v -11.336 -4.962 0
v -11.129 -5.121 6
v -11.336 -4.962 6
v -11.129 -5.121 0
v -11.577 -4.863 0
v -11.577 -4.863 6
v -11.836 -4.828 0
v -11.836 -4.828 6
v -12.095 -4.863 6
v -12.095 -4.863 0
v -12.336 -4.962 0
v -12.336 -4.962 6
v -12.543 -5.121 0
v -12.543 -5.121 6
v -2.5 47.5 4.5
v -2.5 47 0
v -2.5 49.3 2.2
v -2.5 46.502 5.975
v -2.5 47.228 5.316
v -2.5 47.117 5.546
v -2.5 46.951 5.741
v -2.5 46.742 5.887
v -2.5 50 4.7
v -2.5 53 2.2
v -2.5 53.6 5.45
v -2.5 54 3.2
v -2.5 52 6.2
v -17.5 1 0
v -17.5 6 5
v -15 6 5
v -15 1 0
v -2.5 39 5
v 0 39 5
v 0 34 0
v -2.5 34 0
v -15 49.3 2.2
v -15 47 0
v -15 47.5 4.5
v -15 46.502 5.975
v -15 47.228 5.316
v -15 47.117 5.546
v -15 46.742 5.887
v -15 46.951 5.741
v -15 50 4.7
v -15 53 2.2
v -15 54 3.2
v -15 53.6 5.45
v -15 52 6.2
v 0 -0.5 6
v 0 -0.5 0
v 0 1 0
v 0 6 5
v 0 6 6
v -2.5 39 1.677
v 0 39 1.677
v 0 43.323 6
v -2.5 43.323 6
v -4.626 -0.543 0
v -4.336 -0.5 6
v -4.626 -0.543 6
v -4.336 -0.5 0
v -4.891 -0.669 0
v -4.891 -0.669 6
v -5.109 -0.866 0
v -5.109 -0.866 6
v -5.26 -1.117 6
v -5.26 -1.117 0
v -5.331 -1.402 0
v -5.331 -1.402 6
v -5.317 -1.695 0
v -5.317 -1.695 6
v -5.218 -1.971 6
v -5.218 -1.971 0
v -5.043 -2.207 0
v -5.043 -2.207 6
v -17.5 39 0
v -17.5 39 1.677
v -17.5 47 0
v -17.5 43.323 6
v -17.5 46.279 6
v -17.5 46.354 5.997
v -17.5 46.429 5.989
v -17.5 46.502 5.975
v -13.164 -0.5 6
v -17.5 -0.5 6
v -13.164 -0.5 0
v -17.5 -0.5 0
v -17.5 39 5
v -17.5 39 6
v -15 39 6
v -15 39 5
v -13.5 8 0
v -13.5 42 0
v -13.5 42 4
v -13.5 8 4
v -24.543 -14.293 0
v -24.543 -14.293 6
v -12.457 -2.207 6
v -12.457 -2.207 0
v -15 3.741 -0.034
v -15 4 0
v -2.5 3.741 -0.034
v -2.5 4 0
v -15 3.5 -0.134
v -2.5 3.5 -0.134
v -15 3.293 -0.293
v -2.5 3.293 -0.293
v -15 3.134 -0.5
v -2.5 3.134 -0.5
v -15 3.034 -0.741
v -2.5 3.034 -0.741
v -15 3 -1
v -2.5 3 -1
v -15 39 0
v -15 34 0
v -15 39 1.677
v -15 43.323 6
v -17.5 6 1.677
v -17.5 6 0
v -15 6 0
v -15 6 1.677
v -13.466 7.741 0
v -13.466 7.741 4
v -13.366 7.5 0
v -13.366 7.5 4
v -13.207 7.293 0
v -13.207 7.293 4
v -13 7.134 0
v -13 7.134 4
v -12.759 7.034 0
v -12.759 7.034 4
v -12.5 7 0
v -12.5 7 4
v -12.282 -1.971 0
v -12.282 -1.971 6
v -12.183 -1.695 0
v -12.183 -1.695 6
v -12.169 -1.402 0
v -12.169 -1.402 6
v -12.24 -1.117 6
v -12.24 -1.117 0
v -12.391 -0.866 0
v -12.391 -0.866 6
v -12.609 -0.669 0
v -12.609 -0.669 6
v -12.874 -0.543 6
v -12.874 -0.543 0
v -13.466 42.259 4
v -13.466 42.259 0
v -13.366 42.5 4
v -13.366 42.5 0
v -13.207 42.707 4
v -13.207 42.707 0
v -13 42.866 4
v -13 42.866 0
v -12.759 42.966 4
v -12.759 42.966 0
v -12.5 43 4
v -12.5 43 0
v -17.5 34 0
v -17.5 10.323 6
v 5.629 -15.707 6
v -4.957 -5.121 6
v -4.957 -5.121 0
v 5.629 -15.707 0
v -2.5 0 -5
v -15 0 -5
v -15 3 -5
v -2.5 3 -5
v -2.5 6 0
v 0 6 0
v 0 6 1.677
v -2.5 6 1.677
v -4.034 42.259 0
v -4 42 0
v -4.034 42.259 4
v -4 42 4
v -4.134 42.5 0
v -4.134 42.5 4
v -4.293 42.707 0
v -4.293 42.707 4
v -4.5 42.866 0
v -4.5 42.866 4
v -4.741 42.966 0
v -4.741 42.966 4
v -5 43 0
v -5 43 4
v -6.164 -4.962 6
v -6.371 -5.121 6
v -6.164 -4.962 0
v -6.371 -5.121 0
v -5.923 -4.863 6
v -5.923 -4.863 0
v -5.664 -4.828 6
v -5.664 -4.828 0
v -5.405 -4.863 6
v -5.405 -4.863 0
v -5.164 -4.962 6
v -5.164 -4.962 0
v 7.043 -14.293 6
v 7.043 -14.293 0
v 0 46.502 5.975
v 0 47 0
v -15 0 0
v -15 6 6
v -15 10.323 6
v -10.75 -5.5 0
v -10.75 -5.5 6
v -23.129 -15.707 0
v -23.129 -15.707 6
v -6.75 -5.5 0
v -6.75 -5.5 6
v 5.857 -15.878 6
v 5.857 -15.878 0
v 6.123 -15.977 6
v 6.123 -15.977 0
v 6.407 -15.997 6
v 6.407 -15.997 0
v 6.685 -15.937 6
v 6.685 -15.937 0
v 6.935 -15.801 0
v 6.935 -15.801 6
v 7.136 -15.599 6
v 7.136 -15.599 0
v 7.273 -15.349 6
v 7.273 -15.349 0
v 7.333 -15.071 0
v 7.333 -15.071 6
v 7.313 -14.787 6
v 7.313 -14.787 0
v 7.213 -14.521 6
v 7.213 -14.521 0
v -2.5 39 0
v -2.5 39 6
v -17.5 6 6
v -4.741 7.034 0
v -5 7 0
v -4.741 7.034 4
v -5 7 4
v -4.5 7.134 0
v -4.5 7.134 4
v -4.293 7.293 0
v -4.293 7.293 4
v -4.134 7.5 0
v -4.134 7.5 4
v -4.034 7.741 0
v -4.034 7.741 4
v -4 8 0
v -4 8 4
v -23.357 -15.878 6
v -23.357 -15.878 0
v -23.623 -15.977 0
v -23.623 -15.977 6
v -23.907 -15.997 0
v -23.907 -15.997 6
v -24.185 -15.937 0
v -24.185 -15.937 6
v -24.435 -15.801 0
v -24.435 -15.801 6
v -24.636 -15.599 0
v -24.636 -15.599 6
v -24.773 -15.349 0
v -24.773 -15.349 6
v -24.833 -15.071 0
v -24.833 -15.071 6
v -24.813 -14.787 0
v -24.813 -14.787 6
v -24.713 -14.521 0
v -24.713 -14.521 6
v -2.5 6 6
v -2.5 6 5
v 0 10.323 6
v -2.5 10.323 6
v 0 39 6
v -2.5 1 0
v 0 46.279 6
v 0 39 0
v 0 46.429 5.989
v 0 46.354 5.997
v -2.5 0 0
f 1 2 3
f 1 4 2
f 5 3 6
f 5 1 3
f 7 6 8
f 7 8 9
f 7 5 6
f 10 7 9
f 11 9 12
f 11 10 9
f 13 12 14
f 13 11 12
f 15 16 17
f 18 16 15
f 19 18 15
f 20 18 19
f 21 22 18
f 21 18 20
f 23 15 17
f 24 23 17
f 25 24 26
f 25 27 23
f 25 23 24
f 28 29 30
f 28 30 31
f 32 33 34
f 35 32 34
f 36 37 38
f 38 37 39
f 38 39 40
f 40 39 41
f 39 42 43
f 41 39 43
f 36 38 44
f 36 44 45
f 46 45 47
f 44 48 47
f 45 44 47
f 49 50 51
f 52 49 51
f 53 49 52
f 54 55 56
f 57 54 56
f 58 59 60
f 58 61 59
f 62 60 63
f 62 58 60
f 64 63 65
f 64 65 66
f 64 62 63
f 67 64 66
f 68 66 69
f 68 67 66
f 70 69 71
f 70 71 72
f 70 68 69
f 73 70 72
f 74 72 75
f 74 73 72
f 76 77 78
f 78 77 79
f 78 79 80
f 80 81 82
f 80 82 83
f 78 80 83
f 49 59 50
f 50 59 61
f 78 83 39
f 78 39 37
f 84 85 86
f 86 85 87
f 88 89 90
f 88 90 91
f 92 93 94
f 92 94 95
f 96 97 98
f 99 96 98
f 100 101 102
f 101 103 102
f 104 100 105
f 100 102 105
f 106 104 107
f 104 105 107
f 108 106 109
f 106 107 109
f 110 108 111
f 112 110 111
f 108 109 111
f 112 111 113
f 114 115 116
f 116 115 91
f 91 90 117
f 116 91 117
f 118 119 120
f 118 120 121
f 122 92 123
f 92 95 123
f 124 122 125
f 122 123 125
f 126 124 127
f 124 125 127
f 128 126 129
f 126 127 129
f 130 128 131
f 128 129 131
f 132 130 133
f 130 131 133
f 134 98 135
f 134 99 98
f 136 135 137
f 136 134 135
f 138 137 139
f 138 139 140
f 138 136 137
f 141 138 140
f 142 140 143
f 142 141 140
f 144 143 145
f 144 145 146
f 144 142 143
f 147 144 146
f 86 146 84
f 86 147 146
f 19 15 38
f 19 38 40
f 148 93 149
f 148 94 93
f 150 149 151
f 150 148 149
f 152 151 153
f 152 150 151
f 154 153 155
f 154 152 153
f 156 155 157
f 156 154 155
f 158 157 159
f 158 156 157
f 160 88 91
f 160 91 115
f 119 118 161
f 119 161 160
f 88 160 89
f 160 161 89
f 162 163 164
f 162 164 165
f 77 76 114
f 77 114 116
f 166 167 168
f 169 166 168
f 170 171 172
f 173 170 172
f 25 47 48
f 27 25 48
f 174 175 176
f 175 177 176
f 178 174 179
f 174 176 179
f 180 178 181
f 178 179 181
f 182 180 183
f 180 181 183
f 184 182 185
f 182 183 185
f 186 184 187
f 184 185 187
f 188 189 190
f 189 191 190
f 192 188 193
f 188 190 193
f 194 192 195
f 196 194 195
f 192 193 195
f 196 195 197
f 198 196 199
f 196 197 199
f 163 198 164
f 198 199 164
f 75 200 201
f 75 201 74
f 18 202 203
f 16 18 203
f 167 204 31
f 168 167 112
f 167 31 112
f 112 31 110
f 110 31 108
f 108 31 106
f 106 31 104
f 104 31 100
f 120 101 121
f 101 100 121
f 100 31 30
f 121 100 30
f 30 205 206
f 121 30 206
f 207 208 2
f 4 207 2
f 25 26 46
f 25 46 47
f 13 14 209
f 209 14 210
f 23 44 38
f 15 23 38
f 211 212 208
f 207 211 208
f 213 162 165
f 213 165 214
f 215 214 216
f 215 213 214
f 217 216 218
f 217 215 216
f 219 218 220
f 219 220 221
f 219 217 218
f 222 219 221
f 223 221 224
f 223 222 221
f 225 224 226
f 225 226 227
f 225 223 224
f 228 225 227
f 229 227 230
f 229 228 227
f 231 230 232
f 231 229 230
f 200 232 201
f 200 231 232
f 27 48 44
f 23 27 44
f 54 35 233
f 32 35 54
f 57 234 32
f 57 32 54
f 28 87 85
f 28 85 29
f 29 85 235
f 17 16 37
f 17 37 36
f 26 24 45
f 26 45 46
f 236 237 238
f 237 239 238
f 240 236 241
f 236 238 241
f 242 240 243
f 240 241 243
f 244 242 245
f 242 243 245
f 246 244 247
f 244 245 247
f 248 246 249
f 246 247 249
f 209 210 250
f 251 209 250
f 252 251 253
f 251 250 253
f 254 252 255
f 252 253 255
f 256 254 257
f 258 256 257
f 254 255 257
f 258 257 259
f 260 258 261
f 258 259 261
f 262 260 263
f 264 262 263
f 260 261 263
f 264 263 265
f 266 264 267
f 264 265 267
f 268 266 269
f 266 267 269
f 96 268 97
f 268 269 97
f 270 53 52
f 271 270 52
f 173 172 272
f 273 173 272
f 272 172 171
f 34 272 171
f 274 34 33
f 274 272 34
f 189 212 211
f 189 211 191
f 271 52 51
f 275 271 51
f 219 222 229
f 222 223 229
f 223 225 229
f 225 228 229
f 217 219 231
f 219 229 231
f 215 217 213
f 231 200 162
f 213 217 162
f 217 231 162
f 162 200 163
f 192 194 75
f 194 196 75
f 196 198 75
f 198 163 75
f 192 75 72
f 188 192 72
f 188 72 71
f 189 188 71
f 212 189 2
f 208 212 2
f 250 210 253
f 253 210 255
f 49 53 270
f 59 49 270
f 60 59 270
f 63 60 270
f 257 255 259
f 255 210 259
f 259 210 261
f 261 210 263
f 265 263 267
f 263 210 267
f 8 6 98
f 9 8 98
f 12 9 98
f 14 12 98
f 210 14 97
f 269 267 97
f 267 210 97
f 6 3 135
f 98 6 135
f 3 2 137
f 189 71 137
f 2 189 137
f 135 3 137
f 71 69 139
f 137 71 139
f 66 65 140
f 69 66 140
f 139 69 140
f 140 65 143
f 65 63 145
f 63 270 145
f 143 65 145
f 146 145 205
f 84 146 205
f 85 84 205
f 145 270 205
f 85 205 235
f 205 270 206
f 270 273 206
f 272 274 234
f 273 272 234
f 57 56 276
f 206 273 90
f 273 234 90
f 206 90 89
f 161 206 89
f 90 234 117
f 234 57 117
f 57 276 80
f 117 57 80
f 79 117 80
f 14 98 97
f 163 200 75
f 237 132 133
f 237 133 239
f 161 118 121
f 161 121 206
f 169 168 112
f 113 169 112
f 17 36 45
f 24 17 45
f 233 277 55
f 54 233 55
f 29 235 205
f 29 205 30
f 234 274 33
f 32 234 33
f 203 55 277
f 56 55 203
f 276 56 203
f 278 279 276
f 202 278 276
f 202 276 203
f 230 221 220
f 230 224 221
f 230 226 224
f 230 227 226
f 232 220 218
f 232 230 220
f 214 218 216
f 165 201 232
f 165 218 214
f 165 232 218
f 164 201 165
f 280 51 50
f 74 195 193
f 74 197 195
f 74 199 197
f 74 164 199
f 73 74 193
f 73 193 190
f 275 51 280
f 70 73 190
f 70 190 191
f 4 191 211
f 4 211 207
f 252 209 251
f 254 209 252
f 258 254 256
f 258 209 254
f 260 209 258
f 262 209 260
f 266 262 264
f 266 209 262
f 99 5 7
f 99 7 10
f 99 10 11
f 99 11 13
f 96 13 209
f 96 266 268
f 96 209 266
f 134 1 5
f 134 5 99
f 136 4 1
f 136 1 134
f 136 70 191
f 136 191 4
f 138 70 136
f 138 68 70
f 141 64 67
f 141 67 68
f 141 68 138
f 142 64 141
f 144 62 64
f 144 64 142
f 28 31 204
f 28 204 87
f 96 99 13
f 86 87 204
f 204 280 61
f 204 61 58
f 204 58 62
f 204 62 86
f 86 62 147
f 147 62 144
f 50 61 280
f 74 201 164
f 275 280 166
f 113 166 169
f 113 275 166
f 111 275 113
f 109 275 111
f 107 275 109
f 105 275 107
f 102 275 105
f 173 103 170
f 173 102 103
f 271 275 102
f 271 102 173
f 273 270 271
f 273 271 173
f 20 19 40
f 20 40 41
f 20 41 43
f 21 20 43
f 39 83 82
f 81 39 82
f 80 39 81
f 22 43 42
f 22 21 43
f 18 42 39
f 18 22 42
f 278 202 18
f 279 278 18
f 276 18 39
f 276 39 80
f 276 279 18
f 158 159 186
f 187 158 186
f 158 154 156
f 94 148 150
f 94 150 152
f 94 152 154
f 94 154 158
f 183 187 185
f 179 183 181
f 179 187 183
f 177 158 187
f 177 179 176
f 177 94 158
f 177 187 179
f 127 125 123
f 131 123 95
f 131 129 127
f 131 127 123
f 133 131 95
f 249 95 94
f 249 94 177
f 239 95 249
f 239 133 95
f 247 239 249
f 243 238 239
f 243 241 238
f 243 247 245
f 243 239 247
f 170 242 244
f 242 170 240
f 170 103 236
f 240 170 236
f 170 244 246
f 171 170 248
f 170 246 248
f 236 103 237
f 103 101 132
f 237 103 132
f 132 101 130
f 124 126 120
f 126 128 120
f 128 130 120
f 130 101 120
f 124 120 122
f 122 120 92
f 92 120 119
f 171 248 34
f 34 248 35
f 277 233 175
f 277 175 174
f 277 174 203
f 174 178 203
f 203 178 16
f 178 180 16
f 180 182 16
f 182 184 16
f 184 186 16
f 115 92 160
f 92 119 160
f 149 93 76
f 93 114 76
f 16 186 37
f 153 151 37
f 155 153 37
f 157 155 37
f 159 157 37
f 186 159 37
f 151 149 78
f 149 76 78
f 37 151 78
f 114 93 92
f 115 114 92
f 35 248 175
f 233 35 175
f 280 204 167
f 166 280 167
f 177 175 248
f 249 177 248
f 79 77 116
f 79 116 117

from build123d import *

# Parameters (mm, degrees)
F1_DEPTH  = 8.75
F3_DEPTH  = 2.5
F4_R      = 1
F6_DEPTH  = 6
F8_DEPTH  = 2.5
F9_R      = 1
F11_W     = 9.5
F11_H     = 36
F12_DEPTH = 4
F13_R     = 1


# Not quite as in the source:
# - a feature of the source that left no trace in its solid (it failed there, or was rolled back) is left out
# - a pattern or mirror of a feature is missing from the dataset's text; its kind, count and spacing are read off the source's solid


with BuildPart() as f1:
    # F0 (on Right) → F1 (new body)
    with BuildSketch(Plane.YZ):
        Polygon((3, -5), (3, 0), (47, 0), (49.3, 2.2), (53, 2.2), (54, 3.2), (53.6, 5.45), (52, 6.2), (50, 4.7), (47.5, 4.5), (47, 6), (-0.5, 6), (-0.5, 0), (0, 0), (0, -5), align=None)
    extrude(amount=-F1_DEPTH)

    # F1_copies: F1 across plane


with BuildPart() as f1_1:
    add(f1.part)
    add(f1.part.mirror(Plane(origin=(-8.75, 0, 0), x_dir=(0, 0, -1), z_dir=(-1, 0, 0))))

    # F2 (on face) → F3 (cut)
    with BuildSketch(Plane.YZ):
        Polygon((6, 1.6765981284), (10.3234018716, 6), (6, 6), (6, 5), (1, 0), (-4.5781525858, 0), (-4.5781525858, -7.2408299893), (8, -7.2408299893), (8, 0), (6, 0), align=None)
        Polygon((41, 0), (39, 0), (39, 1.6765981284), (43.3234018716, 6), (39, 6), (39, 5), (34, 0), (28.4218474142, 0), (28.4218474142, -7.2408299893), (41, -7.2408299893), align=None)
        Polygon((74, 0), (72, 0), (72, 1.6765981284), (76.3234018716, 6), (72, 6), (72, 5), (67, 0), (61.4218474142, 0), (61.4218474142, -7.2408299893), (74, -7.2408299893), align=None)
    f3 = extrude(amount=-F3_DEPTH, mode=Mode.SUBTRACT)

    # F3_copies: F3 across plane
    add(f3.mirror(Plane(origin=(-8.75, 0, 0), x_dir=(0, 0, -1), z_dir=(-1, 0, 0))), mode=Mode.SUBTRACT)

    # F4
    f4_edges = [f1_1.edges().sort_by_distance(p)[0] for p in [
        (-8.75, 47, 6),
    ]]
    fillet(f4_edges, radius=F4_R)

    # F5 (on face) → F6 (join, through all)
    with BuildSketch(Plane.XY.offset(6)):
        with BuildLine():
            Line((-6.75, -0.5), (-8.75, -0.5))
            Line((-8.75, -0.5), (-8.75, -5.5))
            Line((-8.75, -5.5), (-6.75, -5.5))
            Line((-6.75, -5.5), (-5.6642135624, -4.4142135624))
            Line((-5.6642135624, -4.4142135624), (5.6286796564, -15.7071067812))
            ThreePointArc((5.6286796564, -15.7071067812), (7.0428932188, -15.7071067812), (7.0428932188, -14.2928932188))
            Line((7.0428932188, -14.2928932188), (-6.75, -0.5))
        make_face()
    f6 = extrude(amount=-F6_DEPTH)

    # F6_copies: F6 across plane
    add(f6.mirror(Plane(origin=(-8.75, 0, 0), x_dir=(0, 0, -1), z_dir=(-1, 0, 0))))

    # F7 (on face) → F8 (cut)
    with BuildSketch(Plane.YZ):
        Polygon((46.5, 7.9169040546), (46.5, 6), (47, 0), (57.128790766, 0), (57.128790766, 7.9169040546), align=None)
    f8 = extrude(amount=-F8_DEPTH, mode=Mode.SUBTRACT)

    # F8_copies: F8 across plane
    add(f8.mirror(Plane(origin=(-8.75, 0, 0), x_dir=(0, 0, -1), z_dir=(-1, 0, 0))), mode=Mode.SUBTRACT)

    # F9
    f9_edges = [f1_1.edges().sort_by_distance(p)[0] for p in [
        (-5.664214, -4.414214, 3),
        (-8.75, 3, 0),
        (-10.75, -0.5, 3),
        (-11.835786, -4.414214, 3),
        (-6.75, -0.5, 3),
    ]]
    fillet(f9_edges, radius=F9_R)

    # F11 (on face) → F12 (cut)
    with BuildSketch(Plane(origin=(0, 0, 0), x_dir=(1, 0, 0), z_dir=(0, 0, -1))):
        with Locations((-8.75, -25)):
            Rectangle(F11_W, F11_H)
    extrude(amount=-F12_DEPTH, mode=Mode.SUBTRACT)

    # F13
    f13_edges = [f1_1.edges().sort_by_distance(p)[0] for p in [
        (-13.5, 7, 2),
        (-4, 7, 2),
        (-13.5, 43, 2),
        (-4, 43, 2),
    ]]
    fillet(f13_edges, radius=F13_R)


solid = f1_1.part
